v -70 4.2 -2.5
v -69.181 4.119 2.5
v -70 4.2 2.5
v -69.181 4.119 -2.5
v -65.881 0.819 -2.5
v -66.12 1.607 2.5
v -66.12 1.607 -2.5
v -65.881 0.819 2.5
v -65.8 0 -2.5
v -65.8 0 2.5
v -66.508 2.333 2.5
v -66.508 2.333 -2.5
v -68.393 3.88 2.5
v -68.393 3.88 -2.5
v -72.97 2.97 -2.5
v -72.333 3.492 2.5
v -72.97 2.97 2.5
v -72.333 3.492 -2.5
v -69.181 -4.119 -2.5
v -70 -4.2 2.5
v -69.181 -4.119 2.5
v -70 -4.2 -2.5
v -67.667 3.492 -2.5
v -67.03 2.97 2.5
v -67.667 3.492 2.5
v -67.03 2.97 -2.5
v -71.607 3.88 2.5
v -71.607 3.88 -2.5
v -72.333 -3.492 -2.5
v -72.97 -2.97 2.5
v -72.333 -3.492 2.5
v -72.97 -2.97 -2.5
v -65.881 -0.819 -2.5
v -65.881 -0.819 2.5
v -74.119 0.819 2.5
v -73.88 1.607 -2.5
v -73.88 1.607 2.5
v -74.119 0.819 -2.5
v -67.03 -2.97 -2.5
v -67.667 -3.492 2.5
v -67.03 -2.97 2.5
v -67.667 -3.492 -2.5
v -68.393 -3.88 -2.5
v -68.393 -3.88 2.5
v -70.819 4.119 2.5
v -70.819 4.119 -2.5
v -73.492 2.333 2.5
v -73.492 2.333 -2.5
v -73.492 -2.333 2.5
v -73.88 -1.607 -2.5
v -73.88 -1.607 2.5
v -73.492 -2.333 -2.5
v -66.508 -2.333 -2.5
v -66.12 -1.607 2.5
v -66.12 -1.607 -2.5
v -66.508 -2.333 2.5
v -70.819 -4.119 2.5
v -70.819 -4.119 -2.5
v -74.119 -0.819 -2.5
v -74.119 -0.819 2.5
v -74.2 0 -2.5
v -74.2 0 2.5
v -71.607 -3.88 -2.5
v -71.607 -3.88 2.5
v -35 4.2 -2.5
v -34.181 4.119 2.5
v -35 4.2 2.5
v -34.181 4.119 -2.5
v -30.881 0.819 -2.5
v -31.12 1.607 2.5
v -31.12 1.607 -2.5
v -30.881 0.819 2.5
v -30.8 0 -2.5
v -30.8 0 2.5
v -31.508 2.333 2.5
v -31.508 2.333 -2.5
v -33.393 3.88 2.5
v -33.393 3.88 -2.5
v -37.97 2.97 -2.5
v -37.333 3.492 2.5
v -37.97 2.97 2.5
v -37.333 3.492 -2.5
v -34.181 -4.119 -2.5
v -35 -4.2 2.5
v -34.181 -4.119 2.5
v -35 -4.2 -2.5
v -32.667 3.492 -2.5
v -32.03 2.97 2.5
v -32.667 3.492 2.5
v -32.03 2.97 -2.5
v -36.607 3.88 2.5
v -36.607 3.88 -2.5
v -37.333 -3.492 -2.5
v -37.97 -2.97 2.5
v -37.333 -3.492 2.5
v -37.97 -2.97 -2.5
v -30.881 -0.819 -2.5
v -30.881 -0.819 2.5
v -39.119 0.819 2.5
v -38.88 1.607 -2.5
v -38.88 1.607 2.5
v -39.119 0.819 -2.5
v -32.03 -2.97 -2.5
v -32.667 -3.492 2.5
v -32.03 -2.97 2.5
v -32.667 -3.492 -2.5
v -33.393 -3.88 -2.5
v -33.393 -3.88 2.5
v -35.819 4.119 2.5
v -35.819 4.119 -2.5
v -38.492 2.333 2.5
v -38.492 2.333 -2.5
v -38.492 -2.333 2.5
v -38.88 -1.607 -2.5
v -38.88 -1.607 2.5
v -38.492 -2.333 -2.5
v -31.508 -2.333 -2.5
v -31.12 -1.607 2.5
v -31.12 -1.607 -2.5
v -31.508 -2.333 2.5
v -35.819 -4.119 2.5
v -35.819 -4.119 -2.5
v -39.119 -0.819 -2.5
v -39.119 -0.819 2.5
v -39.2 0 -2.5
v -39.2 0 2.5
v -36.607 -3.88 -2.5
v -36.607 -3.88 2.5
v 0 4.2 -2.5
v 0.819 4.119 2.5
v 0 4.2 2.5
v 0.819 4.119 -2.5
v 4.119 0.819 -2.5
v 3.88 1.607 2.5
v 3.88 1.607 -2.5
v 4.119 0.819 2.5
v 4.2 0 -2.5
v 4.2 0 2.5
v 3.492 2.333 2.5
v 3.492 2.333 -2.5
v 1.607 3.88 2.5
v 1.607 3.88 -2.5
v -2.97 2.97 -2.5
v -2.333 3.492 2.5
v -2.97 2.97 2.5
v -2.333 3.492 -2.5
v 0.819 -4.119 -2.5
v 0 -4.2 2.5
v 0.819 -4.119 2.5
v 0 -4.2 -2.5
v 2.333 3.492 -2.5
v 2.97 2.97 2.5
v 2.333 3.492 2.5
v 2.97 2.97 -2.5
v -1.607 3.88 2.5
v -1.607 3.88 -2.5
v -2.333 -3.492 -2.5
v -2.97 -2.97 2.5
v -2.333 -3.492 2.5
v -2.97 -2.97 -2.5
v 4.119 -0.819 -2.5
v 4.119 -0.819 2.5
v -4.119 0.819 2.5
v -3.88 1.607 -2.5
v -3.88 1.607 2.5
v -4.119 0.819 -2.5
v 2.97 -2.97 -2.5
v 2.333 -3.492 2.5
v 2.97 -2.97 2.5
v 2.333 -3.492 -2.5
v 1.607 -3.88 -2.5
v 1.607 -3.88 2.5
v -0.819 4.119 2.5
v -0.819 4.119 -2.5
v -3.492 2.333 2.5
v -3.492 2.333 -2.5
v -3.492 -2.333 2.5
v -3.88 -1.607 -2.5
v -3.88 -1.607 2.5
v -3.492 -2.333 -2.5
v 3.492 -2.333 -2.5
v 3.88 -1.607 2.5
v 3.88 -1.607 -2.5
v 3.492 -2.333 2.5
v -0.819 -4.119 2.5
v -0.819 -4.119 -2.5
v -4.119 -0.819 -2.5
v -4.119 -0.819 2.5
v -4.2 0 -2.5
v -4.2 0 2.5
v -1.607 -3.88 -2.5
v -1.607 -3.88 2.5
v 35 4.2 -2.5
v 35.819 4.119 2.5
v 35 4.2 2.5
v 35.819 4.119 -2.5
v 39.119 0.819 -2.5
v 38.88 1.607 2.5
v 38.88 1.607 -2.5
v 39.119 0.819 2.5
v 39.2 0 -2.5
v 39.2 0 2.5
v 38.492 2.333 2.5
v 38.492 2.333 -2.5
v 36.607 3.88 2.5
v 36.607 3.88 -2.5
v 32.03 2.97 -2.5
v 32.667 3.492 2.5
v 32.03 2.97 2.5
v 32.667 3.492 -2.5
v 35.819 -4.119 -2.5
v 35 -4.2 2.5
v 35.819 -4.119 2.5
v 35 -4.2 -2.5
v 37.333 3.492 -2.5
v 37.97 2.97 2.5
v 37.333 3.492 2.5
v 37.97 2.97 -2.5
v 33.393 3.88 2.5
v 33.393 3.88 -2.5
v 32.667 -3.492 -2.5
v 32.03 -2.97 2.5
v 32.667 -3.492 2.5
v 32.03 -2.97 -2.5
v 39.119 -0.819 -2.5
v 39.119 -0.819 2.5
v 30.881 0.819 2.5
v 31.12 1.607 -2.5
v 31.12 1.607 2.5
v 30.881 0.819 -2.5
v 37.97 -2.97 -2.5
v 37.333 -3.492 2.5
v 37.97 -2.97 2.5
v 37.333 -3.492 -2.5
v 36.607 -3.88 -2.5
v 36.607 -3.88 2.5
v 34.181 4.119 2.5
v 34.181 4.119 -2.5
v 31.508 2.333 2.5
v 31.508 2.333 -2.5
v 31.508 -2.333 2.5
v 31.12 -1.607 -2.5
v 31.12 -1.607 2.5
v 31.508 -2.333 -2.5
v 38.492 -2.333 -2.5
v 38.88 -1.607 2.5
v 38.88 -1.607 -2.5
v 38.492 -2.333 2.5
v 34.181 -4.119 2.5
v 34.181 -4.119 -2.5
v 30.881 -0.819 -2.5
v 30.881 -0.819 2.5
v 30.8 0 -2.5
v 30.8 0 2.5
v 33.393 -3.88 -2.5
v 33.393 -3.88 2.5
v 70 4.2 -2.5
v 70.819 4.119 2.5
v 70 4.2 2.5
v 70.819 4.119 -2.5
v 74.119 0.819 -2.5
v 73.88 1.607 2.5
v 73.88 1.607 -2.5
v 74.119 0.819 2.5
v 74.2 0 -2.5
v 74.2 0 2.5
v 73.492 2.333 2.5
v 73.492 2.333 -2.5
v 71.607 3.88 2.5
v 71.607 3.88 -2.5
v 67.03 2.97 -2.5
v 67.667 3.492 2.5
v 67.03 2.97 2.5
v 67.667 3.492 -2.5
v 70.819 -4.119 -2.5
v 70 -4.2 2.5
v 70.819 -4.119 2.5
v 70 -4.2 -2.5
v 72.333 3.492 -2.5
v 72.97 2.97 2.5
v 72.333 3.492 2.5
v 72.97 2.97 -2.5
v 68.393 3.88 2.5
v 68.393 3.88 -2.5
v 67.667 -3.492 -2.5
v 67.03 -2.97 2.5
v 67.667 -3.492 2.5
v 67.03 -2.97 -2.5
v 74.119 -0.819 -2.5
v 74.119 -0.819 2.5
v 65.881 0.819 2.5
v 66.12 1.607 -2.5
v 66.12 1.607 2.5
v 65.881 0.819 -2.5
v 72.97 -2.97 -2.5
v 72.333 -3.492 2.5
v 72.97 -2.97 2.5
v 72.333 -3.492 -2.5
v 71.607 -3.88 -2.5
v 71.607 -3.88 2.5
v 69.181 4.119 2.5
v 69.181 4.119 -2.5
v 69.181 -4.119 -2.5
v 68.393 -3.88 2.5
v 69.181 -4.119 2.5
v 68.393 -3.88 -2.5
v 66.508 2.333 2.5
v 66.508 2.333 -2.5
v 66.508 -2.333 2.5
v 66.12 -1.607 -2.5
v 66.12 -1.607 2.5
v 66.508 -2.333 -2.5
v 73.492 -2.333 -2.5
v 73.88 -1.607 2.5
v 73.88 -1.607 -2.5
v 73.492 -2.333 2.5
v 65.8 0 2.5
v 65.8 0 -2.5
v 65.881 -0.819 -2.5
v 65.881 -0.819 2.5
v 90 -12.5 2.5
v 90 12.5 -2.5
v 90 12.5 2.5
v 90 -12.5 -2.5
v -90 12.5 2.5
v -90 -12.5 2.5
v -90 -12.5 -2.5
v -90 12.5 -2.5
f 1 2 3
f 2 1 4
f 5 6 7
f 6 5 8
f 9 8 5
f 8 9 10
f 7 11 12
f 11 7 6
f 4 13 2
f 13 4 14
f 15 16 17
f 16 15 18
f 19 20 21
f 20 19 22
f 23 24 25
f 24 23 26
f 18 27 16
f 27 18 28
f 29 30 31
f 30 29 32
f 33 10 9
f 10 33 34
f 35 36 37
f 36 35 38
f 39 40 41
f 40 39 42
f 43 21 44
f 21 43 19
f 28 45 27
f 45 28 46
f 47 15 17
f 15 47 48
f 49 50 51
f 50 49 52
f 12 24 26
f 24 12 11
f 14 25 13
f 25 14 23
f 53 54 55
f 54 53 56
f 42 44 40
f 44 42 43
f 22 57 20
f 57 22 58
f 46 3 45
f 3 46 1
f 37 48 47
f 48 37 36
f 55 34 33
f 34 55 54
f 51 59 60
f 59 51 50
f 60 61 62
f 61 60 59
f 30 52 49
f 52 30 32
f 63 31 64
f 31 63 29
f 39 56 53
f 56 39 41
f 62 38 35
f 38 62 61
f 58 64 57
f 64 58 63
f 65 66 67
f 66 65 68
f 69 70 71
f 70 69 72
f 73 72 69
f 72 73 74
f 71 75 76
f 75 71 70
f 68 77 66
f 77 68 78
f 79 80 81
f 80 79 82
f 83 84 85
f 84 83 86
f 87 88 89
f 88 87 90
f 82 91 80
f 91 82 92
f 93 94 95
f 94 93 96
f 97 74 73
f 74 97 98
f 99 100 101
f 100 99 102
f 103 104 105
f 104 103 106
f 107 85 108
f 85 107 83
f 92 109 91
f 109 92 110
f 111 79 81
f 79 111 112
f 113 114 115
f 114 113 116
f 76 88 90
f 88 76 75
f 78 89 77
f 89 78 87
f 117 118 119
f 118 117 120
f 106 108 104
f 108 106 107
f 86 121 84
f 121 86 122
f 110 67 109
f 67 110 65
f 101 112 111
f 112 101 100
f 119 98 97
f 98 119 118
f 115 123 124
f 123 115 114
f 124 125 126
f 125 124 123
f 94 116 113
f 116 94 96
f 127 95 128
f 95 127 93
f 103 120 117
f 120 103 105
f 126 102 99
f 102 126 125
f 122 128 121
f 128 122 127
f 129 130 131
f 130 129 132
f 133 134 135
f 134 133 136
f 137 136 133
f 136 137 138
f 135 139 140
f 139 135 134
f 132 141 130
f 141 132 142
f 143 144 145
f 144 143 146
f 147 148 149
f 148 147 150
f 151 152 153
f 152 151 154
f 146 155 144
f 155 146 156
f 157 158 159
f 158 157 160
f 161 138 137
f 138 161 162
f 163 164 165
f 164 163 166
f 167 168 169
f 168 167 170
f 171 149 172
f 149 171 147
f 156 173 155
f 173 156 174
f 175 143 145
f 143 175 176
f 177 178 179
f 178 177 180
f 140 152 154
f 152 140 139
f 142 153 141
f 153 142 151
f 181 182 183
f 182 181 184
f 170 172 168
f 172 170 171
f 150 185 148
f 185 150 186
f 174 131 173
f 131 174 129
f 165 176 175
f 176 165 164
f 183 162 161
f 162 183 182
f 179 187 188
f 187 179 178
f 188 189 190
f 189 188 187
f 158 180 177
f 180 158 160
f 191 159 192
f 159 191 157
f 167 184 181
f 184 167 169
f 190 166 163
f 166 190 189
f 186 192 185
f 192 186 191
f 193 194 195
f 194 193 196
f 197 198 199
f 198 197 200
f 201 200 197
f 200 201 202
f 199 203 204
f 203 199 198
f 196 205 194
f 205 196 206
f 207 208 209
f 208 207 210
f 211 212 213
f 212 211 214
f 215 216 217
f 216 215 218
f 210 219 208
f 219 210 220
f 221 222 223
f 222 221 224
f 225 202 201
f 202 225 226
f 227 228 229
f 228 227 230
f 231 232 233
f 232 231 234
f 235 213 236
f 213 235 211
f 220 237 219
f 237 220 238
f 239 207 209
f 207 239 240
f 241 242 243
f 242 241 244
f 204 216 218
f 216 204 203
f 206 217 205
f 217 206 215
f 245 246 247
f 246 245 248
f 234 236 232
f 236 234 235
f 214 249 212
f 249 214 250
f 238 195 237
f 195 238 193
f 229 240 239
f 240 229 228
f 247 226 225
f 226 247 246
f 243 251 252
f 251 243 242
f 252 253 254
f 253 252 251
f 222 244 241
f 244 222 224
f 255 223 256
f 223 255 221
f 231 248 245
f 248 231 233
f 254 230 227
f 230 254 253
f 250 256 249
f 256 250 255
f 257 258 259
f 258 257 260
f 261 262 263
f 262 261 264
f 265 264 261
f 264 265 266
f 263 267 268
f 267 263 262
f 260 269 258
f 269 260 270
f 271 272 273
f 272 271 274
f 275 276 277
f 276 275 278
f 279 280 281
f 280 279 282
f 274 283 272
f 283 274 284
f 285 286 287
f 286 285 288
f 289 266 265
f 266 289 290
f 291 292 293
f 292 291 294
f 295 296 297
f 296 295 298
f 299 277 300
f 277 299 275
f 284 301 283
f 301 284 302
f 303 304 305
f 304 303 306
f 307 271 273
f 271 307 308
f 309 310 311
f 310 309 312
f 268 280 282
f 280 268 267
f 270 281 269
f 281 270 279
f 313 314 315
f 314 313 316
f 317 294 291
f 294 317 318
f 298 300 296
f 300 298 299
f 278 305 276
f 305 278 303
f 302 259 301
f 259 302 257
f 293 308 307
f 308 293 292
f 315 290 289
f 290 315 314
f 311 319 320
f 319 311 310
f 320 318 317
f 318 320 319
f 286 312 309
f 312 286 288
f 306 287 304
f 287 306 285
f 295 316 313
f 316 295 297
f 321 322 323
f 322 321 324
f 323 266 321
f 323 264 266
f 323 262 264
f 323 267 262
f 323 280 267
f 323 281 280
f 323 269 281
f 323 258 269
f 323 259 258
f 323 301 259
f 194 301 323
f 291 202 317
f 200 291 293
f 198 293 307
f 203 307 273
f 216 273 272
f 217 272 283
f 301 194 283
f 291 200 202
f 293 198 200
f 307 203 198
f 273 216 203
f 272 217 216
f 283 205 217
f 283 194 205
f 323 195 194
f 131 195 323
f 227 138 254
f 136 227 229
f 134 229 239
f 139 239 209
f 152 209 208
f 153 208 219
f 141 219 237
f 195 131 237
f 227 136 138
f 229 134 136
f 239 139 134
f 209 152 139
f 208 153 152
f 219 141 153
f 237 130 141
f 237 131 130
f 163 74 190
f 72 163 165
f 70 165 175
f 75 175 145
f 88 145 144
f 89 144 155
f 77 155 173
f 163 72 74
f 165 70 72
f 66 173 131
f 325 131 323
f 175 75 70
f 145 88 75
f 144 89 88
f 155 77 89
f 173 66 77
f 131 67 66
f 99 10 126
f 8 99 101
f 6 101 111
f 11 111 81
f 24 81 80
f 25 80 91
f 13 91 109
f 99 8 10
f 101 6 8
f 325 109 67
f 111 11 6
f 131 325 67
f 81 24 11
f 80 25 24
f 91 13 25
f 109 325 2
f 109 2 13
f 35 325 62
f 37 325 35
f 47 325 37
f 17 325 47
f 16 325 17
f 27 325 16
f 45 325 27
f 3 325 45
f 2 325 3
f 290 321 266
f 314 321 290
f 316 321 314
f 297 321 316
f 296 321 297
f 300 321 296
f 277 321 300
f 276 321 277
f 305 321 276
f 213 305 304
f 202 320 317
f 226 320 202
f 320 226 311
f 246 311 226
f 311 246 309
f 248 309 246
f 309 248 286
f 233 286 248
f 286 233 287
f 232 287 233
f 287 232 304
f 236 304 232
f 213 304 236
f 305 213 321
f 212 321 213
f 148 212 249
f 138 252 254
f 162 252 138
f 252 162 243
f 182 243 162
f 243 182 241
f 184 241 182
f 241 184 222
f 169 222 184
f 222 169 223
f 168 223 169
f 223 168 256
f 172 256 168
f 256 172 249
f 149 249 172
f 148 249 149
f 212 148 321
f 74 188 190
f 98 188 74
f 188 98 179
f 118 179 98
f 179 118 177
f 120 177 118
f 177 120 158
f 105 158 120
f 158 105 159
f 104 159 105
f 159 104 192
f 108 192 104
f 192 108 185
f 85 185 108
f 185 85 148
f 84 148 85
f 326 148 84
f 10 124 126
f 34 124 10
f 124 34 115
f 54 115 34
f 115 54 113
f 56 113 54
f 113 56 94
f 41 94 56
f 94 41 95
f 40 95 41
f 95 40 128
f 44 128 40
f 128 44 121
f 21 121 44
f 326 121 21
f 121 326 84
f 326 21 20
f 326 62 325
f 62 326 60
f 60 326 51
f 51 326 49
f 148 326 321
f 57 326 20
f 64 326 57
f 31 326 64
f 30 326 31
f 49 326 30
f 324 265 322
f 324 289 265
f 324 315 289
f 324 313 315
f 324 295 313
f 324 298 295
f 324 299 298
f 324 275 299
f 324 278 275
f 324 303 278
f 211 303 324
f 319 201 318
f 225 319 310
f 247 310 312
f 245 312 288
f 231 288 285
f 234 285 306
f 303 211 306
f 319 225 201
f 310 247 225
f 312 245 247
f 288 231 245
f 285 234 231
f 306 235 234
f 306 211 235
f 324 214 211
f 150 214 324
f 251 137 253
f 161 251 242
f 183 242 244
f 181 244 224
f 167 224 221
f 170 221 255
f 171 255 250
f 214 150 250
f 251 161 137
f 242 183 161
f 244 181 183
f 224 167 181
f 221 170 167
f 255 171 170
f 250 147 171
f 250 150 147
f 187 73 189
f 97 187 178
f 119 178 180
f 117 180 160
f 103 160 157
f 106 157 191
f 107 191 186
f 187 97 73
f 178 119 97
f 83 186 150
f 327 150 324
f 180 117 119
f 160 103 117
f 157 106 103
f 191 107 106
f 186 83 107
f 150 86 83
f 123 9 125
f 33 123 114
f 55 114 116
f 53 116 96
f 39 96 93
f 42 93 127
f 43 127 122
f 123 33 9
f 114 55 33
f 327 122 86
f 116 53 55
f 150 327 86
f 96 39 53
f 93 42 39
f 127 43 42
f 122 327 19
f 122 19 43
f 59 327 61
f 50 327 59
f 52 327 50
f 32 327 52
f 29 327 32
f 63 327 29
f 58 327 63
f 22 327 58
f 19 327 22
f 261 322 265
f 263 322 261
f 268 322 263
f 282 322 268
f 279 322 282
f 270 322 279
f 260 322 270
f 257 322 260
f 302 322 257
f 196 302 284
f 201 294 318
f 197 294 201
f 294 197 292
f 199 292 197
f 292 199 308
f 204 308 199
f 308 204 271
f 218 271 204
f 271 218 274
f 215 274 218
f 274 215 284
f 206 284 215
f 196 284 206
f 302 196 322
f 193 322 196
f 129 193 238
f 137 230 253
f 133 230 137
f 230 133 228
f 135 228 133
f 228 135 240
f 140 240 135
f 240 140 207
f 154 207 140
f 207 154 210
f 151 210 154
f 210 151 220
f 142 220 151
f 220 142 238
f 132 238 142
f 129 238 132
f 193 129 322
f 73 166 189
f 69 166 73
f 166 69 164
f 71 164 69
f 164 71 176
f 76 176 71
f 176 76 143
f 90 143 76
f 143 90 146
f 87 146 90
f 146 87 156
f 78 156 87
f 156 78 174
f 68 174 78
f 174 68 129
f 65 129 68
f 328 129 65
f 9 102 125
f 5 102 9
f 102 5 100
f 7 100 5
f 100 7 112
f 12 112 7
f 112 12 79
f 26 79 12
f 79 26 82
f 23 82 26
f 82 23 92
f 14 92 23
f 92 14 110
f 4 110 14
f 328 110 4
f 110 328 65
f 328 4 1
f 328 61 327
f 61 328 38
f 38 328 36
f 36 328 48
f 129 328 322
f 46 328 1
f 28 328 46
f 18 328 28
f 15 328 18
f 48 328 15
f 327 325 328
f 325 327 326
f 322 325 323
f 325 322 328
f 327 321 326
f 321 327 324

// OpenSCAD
$fn = 32;

// ----------------------------------------------------------------------
// Hole bar, 5 x Ø8.4
// row layout, 20 mm edge offset
// ----------------------------------------------------------------------

// --- parameters (mm) ---
bar_w = 25;    // bar width (Y)
bar_t = 5;     // bar thickness (Z)
holes = 5;     // holes per row
hole_d = 8.4;  // hole diameter
edge = 20;     // offset from the bar end to the first hole
pitch = 35;    // pitch between neighbouring holes

// --- derived feature positions (mm) ---
span = (holes - 1) * pitch;   // = 140   distance between the end holes
bar_l = span + 2 * edge;      // = 180   overall bar length
start_x = -bar_l / 2 + edge;  // = -70   X of the first hole
feature_centers = [
  [start_x + 0 * pitch, 0],
  [start_x + 1 * pitch, 0],
  [start_x + 2 * pitch, 0],
  [start_x + 3 * pitch, 0],
  [start_x + 4 * pitch, 0]
];   // hole centres of the first row

// bar with one row of holes, drilled from feature_centers
difference() {
  translate([-bar_l / 2, -bar_w / 2, -bar_t / 2]) cube([bar_l, bar_w, bar_t]);
  for (centre = feature_centers)
    translate([centre[0], centre[1], 0])
      cylinder(d = hole_d, h = bar_t + 2, center = true);
}
